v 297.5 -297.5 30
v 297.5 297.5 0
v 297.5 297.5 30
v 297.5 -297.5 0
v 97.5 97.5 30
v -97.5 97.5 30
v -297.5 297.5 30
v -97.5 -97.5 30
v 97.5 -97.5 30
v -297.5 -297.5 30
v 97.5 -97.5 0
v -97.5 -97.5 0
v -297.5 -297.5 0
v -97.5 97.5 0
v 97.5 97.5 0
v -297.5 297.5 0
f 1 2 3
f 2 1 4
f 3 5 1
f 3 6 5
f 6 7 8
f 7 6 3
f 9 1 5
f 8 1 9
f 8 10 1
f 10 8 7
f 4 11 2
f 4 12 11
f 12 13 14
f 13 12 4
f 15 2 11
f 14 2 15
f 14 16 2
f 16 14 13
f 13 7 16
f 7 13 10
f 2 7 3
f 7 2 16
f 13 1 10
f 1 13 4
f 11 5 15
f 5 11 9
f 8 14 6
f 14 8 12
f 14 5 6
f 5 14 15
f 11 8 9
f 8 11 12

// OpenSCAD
//intersection() {
   //surface(file = "example010.dat", center = true, convexity = 5);
   //rotate(45, [0, 0, 1]) surface(file = "example010.dat", center = true, convexity = 5); 
 //}

thick = 30;
imsize = 195;
pad=400;



//print();
//sheet(0);
//combine();
union() {
   difference() {
     translate([0, 0, thick/2]) cube(size=[imsize+pad,imsize+pad,thick],center=true);
    translate([0, 0, thick/2]) cube(size=[imsize,imsize,1.1*thick],center=true);
   } 
  translate([0, 0, 17]) scale([1, 1, 0.2]) surface(file = "200crop.png", center=true, invert=true);
}

module sheet(off = 0) {
   cube(size=[imsize+50,imsize+50,thick],center=true);
         
}


module print() {
    scale([1, 1, 0.2]) surface(file = "200crop.png",center=true);
    
}
